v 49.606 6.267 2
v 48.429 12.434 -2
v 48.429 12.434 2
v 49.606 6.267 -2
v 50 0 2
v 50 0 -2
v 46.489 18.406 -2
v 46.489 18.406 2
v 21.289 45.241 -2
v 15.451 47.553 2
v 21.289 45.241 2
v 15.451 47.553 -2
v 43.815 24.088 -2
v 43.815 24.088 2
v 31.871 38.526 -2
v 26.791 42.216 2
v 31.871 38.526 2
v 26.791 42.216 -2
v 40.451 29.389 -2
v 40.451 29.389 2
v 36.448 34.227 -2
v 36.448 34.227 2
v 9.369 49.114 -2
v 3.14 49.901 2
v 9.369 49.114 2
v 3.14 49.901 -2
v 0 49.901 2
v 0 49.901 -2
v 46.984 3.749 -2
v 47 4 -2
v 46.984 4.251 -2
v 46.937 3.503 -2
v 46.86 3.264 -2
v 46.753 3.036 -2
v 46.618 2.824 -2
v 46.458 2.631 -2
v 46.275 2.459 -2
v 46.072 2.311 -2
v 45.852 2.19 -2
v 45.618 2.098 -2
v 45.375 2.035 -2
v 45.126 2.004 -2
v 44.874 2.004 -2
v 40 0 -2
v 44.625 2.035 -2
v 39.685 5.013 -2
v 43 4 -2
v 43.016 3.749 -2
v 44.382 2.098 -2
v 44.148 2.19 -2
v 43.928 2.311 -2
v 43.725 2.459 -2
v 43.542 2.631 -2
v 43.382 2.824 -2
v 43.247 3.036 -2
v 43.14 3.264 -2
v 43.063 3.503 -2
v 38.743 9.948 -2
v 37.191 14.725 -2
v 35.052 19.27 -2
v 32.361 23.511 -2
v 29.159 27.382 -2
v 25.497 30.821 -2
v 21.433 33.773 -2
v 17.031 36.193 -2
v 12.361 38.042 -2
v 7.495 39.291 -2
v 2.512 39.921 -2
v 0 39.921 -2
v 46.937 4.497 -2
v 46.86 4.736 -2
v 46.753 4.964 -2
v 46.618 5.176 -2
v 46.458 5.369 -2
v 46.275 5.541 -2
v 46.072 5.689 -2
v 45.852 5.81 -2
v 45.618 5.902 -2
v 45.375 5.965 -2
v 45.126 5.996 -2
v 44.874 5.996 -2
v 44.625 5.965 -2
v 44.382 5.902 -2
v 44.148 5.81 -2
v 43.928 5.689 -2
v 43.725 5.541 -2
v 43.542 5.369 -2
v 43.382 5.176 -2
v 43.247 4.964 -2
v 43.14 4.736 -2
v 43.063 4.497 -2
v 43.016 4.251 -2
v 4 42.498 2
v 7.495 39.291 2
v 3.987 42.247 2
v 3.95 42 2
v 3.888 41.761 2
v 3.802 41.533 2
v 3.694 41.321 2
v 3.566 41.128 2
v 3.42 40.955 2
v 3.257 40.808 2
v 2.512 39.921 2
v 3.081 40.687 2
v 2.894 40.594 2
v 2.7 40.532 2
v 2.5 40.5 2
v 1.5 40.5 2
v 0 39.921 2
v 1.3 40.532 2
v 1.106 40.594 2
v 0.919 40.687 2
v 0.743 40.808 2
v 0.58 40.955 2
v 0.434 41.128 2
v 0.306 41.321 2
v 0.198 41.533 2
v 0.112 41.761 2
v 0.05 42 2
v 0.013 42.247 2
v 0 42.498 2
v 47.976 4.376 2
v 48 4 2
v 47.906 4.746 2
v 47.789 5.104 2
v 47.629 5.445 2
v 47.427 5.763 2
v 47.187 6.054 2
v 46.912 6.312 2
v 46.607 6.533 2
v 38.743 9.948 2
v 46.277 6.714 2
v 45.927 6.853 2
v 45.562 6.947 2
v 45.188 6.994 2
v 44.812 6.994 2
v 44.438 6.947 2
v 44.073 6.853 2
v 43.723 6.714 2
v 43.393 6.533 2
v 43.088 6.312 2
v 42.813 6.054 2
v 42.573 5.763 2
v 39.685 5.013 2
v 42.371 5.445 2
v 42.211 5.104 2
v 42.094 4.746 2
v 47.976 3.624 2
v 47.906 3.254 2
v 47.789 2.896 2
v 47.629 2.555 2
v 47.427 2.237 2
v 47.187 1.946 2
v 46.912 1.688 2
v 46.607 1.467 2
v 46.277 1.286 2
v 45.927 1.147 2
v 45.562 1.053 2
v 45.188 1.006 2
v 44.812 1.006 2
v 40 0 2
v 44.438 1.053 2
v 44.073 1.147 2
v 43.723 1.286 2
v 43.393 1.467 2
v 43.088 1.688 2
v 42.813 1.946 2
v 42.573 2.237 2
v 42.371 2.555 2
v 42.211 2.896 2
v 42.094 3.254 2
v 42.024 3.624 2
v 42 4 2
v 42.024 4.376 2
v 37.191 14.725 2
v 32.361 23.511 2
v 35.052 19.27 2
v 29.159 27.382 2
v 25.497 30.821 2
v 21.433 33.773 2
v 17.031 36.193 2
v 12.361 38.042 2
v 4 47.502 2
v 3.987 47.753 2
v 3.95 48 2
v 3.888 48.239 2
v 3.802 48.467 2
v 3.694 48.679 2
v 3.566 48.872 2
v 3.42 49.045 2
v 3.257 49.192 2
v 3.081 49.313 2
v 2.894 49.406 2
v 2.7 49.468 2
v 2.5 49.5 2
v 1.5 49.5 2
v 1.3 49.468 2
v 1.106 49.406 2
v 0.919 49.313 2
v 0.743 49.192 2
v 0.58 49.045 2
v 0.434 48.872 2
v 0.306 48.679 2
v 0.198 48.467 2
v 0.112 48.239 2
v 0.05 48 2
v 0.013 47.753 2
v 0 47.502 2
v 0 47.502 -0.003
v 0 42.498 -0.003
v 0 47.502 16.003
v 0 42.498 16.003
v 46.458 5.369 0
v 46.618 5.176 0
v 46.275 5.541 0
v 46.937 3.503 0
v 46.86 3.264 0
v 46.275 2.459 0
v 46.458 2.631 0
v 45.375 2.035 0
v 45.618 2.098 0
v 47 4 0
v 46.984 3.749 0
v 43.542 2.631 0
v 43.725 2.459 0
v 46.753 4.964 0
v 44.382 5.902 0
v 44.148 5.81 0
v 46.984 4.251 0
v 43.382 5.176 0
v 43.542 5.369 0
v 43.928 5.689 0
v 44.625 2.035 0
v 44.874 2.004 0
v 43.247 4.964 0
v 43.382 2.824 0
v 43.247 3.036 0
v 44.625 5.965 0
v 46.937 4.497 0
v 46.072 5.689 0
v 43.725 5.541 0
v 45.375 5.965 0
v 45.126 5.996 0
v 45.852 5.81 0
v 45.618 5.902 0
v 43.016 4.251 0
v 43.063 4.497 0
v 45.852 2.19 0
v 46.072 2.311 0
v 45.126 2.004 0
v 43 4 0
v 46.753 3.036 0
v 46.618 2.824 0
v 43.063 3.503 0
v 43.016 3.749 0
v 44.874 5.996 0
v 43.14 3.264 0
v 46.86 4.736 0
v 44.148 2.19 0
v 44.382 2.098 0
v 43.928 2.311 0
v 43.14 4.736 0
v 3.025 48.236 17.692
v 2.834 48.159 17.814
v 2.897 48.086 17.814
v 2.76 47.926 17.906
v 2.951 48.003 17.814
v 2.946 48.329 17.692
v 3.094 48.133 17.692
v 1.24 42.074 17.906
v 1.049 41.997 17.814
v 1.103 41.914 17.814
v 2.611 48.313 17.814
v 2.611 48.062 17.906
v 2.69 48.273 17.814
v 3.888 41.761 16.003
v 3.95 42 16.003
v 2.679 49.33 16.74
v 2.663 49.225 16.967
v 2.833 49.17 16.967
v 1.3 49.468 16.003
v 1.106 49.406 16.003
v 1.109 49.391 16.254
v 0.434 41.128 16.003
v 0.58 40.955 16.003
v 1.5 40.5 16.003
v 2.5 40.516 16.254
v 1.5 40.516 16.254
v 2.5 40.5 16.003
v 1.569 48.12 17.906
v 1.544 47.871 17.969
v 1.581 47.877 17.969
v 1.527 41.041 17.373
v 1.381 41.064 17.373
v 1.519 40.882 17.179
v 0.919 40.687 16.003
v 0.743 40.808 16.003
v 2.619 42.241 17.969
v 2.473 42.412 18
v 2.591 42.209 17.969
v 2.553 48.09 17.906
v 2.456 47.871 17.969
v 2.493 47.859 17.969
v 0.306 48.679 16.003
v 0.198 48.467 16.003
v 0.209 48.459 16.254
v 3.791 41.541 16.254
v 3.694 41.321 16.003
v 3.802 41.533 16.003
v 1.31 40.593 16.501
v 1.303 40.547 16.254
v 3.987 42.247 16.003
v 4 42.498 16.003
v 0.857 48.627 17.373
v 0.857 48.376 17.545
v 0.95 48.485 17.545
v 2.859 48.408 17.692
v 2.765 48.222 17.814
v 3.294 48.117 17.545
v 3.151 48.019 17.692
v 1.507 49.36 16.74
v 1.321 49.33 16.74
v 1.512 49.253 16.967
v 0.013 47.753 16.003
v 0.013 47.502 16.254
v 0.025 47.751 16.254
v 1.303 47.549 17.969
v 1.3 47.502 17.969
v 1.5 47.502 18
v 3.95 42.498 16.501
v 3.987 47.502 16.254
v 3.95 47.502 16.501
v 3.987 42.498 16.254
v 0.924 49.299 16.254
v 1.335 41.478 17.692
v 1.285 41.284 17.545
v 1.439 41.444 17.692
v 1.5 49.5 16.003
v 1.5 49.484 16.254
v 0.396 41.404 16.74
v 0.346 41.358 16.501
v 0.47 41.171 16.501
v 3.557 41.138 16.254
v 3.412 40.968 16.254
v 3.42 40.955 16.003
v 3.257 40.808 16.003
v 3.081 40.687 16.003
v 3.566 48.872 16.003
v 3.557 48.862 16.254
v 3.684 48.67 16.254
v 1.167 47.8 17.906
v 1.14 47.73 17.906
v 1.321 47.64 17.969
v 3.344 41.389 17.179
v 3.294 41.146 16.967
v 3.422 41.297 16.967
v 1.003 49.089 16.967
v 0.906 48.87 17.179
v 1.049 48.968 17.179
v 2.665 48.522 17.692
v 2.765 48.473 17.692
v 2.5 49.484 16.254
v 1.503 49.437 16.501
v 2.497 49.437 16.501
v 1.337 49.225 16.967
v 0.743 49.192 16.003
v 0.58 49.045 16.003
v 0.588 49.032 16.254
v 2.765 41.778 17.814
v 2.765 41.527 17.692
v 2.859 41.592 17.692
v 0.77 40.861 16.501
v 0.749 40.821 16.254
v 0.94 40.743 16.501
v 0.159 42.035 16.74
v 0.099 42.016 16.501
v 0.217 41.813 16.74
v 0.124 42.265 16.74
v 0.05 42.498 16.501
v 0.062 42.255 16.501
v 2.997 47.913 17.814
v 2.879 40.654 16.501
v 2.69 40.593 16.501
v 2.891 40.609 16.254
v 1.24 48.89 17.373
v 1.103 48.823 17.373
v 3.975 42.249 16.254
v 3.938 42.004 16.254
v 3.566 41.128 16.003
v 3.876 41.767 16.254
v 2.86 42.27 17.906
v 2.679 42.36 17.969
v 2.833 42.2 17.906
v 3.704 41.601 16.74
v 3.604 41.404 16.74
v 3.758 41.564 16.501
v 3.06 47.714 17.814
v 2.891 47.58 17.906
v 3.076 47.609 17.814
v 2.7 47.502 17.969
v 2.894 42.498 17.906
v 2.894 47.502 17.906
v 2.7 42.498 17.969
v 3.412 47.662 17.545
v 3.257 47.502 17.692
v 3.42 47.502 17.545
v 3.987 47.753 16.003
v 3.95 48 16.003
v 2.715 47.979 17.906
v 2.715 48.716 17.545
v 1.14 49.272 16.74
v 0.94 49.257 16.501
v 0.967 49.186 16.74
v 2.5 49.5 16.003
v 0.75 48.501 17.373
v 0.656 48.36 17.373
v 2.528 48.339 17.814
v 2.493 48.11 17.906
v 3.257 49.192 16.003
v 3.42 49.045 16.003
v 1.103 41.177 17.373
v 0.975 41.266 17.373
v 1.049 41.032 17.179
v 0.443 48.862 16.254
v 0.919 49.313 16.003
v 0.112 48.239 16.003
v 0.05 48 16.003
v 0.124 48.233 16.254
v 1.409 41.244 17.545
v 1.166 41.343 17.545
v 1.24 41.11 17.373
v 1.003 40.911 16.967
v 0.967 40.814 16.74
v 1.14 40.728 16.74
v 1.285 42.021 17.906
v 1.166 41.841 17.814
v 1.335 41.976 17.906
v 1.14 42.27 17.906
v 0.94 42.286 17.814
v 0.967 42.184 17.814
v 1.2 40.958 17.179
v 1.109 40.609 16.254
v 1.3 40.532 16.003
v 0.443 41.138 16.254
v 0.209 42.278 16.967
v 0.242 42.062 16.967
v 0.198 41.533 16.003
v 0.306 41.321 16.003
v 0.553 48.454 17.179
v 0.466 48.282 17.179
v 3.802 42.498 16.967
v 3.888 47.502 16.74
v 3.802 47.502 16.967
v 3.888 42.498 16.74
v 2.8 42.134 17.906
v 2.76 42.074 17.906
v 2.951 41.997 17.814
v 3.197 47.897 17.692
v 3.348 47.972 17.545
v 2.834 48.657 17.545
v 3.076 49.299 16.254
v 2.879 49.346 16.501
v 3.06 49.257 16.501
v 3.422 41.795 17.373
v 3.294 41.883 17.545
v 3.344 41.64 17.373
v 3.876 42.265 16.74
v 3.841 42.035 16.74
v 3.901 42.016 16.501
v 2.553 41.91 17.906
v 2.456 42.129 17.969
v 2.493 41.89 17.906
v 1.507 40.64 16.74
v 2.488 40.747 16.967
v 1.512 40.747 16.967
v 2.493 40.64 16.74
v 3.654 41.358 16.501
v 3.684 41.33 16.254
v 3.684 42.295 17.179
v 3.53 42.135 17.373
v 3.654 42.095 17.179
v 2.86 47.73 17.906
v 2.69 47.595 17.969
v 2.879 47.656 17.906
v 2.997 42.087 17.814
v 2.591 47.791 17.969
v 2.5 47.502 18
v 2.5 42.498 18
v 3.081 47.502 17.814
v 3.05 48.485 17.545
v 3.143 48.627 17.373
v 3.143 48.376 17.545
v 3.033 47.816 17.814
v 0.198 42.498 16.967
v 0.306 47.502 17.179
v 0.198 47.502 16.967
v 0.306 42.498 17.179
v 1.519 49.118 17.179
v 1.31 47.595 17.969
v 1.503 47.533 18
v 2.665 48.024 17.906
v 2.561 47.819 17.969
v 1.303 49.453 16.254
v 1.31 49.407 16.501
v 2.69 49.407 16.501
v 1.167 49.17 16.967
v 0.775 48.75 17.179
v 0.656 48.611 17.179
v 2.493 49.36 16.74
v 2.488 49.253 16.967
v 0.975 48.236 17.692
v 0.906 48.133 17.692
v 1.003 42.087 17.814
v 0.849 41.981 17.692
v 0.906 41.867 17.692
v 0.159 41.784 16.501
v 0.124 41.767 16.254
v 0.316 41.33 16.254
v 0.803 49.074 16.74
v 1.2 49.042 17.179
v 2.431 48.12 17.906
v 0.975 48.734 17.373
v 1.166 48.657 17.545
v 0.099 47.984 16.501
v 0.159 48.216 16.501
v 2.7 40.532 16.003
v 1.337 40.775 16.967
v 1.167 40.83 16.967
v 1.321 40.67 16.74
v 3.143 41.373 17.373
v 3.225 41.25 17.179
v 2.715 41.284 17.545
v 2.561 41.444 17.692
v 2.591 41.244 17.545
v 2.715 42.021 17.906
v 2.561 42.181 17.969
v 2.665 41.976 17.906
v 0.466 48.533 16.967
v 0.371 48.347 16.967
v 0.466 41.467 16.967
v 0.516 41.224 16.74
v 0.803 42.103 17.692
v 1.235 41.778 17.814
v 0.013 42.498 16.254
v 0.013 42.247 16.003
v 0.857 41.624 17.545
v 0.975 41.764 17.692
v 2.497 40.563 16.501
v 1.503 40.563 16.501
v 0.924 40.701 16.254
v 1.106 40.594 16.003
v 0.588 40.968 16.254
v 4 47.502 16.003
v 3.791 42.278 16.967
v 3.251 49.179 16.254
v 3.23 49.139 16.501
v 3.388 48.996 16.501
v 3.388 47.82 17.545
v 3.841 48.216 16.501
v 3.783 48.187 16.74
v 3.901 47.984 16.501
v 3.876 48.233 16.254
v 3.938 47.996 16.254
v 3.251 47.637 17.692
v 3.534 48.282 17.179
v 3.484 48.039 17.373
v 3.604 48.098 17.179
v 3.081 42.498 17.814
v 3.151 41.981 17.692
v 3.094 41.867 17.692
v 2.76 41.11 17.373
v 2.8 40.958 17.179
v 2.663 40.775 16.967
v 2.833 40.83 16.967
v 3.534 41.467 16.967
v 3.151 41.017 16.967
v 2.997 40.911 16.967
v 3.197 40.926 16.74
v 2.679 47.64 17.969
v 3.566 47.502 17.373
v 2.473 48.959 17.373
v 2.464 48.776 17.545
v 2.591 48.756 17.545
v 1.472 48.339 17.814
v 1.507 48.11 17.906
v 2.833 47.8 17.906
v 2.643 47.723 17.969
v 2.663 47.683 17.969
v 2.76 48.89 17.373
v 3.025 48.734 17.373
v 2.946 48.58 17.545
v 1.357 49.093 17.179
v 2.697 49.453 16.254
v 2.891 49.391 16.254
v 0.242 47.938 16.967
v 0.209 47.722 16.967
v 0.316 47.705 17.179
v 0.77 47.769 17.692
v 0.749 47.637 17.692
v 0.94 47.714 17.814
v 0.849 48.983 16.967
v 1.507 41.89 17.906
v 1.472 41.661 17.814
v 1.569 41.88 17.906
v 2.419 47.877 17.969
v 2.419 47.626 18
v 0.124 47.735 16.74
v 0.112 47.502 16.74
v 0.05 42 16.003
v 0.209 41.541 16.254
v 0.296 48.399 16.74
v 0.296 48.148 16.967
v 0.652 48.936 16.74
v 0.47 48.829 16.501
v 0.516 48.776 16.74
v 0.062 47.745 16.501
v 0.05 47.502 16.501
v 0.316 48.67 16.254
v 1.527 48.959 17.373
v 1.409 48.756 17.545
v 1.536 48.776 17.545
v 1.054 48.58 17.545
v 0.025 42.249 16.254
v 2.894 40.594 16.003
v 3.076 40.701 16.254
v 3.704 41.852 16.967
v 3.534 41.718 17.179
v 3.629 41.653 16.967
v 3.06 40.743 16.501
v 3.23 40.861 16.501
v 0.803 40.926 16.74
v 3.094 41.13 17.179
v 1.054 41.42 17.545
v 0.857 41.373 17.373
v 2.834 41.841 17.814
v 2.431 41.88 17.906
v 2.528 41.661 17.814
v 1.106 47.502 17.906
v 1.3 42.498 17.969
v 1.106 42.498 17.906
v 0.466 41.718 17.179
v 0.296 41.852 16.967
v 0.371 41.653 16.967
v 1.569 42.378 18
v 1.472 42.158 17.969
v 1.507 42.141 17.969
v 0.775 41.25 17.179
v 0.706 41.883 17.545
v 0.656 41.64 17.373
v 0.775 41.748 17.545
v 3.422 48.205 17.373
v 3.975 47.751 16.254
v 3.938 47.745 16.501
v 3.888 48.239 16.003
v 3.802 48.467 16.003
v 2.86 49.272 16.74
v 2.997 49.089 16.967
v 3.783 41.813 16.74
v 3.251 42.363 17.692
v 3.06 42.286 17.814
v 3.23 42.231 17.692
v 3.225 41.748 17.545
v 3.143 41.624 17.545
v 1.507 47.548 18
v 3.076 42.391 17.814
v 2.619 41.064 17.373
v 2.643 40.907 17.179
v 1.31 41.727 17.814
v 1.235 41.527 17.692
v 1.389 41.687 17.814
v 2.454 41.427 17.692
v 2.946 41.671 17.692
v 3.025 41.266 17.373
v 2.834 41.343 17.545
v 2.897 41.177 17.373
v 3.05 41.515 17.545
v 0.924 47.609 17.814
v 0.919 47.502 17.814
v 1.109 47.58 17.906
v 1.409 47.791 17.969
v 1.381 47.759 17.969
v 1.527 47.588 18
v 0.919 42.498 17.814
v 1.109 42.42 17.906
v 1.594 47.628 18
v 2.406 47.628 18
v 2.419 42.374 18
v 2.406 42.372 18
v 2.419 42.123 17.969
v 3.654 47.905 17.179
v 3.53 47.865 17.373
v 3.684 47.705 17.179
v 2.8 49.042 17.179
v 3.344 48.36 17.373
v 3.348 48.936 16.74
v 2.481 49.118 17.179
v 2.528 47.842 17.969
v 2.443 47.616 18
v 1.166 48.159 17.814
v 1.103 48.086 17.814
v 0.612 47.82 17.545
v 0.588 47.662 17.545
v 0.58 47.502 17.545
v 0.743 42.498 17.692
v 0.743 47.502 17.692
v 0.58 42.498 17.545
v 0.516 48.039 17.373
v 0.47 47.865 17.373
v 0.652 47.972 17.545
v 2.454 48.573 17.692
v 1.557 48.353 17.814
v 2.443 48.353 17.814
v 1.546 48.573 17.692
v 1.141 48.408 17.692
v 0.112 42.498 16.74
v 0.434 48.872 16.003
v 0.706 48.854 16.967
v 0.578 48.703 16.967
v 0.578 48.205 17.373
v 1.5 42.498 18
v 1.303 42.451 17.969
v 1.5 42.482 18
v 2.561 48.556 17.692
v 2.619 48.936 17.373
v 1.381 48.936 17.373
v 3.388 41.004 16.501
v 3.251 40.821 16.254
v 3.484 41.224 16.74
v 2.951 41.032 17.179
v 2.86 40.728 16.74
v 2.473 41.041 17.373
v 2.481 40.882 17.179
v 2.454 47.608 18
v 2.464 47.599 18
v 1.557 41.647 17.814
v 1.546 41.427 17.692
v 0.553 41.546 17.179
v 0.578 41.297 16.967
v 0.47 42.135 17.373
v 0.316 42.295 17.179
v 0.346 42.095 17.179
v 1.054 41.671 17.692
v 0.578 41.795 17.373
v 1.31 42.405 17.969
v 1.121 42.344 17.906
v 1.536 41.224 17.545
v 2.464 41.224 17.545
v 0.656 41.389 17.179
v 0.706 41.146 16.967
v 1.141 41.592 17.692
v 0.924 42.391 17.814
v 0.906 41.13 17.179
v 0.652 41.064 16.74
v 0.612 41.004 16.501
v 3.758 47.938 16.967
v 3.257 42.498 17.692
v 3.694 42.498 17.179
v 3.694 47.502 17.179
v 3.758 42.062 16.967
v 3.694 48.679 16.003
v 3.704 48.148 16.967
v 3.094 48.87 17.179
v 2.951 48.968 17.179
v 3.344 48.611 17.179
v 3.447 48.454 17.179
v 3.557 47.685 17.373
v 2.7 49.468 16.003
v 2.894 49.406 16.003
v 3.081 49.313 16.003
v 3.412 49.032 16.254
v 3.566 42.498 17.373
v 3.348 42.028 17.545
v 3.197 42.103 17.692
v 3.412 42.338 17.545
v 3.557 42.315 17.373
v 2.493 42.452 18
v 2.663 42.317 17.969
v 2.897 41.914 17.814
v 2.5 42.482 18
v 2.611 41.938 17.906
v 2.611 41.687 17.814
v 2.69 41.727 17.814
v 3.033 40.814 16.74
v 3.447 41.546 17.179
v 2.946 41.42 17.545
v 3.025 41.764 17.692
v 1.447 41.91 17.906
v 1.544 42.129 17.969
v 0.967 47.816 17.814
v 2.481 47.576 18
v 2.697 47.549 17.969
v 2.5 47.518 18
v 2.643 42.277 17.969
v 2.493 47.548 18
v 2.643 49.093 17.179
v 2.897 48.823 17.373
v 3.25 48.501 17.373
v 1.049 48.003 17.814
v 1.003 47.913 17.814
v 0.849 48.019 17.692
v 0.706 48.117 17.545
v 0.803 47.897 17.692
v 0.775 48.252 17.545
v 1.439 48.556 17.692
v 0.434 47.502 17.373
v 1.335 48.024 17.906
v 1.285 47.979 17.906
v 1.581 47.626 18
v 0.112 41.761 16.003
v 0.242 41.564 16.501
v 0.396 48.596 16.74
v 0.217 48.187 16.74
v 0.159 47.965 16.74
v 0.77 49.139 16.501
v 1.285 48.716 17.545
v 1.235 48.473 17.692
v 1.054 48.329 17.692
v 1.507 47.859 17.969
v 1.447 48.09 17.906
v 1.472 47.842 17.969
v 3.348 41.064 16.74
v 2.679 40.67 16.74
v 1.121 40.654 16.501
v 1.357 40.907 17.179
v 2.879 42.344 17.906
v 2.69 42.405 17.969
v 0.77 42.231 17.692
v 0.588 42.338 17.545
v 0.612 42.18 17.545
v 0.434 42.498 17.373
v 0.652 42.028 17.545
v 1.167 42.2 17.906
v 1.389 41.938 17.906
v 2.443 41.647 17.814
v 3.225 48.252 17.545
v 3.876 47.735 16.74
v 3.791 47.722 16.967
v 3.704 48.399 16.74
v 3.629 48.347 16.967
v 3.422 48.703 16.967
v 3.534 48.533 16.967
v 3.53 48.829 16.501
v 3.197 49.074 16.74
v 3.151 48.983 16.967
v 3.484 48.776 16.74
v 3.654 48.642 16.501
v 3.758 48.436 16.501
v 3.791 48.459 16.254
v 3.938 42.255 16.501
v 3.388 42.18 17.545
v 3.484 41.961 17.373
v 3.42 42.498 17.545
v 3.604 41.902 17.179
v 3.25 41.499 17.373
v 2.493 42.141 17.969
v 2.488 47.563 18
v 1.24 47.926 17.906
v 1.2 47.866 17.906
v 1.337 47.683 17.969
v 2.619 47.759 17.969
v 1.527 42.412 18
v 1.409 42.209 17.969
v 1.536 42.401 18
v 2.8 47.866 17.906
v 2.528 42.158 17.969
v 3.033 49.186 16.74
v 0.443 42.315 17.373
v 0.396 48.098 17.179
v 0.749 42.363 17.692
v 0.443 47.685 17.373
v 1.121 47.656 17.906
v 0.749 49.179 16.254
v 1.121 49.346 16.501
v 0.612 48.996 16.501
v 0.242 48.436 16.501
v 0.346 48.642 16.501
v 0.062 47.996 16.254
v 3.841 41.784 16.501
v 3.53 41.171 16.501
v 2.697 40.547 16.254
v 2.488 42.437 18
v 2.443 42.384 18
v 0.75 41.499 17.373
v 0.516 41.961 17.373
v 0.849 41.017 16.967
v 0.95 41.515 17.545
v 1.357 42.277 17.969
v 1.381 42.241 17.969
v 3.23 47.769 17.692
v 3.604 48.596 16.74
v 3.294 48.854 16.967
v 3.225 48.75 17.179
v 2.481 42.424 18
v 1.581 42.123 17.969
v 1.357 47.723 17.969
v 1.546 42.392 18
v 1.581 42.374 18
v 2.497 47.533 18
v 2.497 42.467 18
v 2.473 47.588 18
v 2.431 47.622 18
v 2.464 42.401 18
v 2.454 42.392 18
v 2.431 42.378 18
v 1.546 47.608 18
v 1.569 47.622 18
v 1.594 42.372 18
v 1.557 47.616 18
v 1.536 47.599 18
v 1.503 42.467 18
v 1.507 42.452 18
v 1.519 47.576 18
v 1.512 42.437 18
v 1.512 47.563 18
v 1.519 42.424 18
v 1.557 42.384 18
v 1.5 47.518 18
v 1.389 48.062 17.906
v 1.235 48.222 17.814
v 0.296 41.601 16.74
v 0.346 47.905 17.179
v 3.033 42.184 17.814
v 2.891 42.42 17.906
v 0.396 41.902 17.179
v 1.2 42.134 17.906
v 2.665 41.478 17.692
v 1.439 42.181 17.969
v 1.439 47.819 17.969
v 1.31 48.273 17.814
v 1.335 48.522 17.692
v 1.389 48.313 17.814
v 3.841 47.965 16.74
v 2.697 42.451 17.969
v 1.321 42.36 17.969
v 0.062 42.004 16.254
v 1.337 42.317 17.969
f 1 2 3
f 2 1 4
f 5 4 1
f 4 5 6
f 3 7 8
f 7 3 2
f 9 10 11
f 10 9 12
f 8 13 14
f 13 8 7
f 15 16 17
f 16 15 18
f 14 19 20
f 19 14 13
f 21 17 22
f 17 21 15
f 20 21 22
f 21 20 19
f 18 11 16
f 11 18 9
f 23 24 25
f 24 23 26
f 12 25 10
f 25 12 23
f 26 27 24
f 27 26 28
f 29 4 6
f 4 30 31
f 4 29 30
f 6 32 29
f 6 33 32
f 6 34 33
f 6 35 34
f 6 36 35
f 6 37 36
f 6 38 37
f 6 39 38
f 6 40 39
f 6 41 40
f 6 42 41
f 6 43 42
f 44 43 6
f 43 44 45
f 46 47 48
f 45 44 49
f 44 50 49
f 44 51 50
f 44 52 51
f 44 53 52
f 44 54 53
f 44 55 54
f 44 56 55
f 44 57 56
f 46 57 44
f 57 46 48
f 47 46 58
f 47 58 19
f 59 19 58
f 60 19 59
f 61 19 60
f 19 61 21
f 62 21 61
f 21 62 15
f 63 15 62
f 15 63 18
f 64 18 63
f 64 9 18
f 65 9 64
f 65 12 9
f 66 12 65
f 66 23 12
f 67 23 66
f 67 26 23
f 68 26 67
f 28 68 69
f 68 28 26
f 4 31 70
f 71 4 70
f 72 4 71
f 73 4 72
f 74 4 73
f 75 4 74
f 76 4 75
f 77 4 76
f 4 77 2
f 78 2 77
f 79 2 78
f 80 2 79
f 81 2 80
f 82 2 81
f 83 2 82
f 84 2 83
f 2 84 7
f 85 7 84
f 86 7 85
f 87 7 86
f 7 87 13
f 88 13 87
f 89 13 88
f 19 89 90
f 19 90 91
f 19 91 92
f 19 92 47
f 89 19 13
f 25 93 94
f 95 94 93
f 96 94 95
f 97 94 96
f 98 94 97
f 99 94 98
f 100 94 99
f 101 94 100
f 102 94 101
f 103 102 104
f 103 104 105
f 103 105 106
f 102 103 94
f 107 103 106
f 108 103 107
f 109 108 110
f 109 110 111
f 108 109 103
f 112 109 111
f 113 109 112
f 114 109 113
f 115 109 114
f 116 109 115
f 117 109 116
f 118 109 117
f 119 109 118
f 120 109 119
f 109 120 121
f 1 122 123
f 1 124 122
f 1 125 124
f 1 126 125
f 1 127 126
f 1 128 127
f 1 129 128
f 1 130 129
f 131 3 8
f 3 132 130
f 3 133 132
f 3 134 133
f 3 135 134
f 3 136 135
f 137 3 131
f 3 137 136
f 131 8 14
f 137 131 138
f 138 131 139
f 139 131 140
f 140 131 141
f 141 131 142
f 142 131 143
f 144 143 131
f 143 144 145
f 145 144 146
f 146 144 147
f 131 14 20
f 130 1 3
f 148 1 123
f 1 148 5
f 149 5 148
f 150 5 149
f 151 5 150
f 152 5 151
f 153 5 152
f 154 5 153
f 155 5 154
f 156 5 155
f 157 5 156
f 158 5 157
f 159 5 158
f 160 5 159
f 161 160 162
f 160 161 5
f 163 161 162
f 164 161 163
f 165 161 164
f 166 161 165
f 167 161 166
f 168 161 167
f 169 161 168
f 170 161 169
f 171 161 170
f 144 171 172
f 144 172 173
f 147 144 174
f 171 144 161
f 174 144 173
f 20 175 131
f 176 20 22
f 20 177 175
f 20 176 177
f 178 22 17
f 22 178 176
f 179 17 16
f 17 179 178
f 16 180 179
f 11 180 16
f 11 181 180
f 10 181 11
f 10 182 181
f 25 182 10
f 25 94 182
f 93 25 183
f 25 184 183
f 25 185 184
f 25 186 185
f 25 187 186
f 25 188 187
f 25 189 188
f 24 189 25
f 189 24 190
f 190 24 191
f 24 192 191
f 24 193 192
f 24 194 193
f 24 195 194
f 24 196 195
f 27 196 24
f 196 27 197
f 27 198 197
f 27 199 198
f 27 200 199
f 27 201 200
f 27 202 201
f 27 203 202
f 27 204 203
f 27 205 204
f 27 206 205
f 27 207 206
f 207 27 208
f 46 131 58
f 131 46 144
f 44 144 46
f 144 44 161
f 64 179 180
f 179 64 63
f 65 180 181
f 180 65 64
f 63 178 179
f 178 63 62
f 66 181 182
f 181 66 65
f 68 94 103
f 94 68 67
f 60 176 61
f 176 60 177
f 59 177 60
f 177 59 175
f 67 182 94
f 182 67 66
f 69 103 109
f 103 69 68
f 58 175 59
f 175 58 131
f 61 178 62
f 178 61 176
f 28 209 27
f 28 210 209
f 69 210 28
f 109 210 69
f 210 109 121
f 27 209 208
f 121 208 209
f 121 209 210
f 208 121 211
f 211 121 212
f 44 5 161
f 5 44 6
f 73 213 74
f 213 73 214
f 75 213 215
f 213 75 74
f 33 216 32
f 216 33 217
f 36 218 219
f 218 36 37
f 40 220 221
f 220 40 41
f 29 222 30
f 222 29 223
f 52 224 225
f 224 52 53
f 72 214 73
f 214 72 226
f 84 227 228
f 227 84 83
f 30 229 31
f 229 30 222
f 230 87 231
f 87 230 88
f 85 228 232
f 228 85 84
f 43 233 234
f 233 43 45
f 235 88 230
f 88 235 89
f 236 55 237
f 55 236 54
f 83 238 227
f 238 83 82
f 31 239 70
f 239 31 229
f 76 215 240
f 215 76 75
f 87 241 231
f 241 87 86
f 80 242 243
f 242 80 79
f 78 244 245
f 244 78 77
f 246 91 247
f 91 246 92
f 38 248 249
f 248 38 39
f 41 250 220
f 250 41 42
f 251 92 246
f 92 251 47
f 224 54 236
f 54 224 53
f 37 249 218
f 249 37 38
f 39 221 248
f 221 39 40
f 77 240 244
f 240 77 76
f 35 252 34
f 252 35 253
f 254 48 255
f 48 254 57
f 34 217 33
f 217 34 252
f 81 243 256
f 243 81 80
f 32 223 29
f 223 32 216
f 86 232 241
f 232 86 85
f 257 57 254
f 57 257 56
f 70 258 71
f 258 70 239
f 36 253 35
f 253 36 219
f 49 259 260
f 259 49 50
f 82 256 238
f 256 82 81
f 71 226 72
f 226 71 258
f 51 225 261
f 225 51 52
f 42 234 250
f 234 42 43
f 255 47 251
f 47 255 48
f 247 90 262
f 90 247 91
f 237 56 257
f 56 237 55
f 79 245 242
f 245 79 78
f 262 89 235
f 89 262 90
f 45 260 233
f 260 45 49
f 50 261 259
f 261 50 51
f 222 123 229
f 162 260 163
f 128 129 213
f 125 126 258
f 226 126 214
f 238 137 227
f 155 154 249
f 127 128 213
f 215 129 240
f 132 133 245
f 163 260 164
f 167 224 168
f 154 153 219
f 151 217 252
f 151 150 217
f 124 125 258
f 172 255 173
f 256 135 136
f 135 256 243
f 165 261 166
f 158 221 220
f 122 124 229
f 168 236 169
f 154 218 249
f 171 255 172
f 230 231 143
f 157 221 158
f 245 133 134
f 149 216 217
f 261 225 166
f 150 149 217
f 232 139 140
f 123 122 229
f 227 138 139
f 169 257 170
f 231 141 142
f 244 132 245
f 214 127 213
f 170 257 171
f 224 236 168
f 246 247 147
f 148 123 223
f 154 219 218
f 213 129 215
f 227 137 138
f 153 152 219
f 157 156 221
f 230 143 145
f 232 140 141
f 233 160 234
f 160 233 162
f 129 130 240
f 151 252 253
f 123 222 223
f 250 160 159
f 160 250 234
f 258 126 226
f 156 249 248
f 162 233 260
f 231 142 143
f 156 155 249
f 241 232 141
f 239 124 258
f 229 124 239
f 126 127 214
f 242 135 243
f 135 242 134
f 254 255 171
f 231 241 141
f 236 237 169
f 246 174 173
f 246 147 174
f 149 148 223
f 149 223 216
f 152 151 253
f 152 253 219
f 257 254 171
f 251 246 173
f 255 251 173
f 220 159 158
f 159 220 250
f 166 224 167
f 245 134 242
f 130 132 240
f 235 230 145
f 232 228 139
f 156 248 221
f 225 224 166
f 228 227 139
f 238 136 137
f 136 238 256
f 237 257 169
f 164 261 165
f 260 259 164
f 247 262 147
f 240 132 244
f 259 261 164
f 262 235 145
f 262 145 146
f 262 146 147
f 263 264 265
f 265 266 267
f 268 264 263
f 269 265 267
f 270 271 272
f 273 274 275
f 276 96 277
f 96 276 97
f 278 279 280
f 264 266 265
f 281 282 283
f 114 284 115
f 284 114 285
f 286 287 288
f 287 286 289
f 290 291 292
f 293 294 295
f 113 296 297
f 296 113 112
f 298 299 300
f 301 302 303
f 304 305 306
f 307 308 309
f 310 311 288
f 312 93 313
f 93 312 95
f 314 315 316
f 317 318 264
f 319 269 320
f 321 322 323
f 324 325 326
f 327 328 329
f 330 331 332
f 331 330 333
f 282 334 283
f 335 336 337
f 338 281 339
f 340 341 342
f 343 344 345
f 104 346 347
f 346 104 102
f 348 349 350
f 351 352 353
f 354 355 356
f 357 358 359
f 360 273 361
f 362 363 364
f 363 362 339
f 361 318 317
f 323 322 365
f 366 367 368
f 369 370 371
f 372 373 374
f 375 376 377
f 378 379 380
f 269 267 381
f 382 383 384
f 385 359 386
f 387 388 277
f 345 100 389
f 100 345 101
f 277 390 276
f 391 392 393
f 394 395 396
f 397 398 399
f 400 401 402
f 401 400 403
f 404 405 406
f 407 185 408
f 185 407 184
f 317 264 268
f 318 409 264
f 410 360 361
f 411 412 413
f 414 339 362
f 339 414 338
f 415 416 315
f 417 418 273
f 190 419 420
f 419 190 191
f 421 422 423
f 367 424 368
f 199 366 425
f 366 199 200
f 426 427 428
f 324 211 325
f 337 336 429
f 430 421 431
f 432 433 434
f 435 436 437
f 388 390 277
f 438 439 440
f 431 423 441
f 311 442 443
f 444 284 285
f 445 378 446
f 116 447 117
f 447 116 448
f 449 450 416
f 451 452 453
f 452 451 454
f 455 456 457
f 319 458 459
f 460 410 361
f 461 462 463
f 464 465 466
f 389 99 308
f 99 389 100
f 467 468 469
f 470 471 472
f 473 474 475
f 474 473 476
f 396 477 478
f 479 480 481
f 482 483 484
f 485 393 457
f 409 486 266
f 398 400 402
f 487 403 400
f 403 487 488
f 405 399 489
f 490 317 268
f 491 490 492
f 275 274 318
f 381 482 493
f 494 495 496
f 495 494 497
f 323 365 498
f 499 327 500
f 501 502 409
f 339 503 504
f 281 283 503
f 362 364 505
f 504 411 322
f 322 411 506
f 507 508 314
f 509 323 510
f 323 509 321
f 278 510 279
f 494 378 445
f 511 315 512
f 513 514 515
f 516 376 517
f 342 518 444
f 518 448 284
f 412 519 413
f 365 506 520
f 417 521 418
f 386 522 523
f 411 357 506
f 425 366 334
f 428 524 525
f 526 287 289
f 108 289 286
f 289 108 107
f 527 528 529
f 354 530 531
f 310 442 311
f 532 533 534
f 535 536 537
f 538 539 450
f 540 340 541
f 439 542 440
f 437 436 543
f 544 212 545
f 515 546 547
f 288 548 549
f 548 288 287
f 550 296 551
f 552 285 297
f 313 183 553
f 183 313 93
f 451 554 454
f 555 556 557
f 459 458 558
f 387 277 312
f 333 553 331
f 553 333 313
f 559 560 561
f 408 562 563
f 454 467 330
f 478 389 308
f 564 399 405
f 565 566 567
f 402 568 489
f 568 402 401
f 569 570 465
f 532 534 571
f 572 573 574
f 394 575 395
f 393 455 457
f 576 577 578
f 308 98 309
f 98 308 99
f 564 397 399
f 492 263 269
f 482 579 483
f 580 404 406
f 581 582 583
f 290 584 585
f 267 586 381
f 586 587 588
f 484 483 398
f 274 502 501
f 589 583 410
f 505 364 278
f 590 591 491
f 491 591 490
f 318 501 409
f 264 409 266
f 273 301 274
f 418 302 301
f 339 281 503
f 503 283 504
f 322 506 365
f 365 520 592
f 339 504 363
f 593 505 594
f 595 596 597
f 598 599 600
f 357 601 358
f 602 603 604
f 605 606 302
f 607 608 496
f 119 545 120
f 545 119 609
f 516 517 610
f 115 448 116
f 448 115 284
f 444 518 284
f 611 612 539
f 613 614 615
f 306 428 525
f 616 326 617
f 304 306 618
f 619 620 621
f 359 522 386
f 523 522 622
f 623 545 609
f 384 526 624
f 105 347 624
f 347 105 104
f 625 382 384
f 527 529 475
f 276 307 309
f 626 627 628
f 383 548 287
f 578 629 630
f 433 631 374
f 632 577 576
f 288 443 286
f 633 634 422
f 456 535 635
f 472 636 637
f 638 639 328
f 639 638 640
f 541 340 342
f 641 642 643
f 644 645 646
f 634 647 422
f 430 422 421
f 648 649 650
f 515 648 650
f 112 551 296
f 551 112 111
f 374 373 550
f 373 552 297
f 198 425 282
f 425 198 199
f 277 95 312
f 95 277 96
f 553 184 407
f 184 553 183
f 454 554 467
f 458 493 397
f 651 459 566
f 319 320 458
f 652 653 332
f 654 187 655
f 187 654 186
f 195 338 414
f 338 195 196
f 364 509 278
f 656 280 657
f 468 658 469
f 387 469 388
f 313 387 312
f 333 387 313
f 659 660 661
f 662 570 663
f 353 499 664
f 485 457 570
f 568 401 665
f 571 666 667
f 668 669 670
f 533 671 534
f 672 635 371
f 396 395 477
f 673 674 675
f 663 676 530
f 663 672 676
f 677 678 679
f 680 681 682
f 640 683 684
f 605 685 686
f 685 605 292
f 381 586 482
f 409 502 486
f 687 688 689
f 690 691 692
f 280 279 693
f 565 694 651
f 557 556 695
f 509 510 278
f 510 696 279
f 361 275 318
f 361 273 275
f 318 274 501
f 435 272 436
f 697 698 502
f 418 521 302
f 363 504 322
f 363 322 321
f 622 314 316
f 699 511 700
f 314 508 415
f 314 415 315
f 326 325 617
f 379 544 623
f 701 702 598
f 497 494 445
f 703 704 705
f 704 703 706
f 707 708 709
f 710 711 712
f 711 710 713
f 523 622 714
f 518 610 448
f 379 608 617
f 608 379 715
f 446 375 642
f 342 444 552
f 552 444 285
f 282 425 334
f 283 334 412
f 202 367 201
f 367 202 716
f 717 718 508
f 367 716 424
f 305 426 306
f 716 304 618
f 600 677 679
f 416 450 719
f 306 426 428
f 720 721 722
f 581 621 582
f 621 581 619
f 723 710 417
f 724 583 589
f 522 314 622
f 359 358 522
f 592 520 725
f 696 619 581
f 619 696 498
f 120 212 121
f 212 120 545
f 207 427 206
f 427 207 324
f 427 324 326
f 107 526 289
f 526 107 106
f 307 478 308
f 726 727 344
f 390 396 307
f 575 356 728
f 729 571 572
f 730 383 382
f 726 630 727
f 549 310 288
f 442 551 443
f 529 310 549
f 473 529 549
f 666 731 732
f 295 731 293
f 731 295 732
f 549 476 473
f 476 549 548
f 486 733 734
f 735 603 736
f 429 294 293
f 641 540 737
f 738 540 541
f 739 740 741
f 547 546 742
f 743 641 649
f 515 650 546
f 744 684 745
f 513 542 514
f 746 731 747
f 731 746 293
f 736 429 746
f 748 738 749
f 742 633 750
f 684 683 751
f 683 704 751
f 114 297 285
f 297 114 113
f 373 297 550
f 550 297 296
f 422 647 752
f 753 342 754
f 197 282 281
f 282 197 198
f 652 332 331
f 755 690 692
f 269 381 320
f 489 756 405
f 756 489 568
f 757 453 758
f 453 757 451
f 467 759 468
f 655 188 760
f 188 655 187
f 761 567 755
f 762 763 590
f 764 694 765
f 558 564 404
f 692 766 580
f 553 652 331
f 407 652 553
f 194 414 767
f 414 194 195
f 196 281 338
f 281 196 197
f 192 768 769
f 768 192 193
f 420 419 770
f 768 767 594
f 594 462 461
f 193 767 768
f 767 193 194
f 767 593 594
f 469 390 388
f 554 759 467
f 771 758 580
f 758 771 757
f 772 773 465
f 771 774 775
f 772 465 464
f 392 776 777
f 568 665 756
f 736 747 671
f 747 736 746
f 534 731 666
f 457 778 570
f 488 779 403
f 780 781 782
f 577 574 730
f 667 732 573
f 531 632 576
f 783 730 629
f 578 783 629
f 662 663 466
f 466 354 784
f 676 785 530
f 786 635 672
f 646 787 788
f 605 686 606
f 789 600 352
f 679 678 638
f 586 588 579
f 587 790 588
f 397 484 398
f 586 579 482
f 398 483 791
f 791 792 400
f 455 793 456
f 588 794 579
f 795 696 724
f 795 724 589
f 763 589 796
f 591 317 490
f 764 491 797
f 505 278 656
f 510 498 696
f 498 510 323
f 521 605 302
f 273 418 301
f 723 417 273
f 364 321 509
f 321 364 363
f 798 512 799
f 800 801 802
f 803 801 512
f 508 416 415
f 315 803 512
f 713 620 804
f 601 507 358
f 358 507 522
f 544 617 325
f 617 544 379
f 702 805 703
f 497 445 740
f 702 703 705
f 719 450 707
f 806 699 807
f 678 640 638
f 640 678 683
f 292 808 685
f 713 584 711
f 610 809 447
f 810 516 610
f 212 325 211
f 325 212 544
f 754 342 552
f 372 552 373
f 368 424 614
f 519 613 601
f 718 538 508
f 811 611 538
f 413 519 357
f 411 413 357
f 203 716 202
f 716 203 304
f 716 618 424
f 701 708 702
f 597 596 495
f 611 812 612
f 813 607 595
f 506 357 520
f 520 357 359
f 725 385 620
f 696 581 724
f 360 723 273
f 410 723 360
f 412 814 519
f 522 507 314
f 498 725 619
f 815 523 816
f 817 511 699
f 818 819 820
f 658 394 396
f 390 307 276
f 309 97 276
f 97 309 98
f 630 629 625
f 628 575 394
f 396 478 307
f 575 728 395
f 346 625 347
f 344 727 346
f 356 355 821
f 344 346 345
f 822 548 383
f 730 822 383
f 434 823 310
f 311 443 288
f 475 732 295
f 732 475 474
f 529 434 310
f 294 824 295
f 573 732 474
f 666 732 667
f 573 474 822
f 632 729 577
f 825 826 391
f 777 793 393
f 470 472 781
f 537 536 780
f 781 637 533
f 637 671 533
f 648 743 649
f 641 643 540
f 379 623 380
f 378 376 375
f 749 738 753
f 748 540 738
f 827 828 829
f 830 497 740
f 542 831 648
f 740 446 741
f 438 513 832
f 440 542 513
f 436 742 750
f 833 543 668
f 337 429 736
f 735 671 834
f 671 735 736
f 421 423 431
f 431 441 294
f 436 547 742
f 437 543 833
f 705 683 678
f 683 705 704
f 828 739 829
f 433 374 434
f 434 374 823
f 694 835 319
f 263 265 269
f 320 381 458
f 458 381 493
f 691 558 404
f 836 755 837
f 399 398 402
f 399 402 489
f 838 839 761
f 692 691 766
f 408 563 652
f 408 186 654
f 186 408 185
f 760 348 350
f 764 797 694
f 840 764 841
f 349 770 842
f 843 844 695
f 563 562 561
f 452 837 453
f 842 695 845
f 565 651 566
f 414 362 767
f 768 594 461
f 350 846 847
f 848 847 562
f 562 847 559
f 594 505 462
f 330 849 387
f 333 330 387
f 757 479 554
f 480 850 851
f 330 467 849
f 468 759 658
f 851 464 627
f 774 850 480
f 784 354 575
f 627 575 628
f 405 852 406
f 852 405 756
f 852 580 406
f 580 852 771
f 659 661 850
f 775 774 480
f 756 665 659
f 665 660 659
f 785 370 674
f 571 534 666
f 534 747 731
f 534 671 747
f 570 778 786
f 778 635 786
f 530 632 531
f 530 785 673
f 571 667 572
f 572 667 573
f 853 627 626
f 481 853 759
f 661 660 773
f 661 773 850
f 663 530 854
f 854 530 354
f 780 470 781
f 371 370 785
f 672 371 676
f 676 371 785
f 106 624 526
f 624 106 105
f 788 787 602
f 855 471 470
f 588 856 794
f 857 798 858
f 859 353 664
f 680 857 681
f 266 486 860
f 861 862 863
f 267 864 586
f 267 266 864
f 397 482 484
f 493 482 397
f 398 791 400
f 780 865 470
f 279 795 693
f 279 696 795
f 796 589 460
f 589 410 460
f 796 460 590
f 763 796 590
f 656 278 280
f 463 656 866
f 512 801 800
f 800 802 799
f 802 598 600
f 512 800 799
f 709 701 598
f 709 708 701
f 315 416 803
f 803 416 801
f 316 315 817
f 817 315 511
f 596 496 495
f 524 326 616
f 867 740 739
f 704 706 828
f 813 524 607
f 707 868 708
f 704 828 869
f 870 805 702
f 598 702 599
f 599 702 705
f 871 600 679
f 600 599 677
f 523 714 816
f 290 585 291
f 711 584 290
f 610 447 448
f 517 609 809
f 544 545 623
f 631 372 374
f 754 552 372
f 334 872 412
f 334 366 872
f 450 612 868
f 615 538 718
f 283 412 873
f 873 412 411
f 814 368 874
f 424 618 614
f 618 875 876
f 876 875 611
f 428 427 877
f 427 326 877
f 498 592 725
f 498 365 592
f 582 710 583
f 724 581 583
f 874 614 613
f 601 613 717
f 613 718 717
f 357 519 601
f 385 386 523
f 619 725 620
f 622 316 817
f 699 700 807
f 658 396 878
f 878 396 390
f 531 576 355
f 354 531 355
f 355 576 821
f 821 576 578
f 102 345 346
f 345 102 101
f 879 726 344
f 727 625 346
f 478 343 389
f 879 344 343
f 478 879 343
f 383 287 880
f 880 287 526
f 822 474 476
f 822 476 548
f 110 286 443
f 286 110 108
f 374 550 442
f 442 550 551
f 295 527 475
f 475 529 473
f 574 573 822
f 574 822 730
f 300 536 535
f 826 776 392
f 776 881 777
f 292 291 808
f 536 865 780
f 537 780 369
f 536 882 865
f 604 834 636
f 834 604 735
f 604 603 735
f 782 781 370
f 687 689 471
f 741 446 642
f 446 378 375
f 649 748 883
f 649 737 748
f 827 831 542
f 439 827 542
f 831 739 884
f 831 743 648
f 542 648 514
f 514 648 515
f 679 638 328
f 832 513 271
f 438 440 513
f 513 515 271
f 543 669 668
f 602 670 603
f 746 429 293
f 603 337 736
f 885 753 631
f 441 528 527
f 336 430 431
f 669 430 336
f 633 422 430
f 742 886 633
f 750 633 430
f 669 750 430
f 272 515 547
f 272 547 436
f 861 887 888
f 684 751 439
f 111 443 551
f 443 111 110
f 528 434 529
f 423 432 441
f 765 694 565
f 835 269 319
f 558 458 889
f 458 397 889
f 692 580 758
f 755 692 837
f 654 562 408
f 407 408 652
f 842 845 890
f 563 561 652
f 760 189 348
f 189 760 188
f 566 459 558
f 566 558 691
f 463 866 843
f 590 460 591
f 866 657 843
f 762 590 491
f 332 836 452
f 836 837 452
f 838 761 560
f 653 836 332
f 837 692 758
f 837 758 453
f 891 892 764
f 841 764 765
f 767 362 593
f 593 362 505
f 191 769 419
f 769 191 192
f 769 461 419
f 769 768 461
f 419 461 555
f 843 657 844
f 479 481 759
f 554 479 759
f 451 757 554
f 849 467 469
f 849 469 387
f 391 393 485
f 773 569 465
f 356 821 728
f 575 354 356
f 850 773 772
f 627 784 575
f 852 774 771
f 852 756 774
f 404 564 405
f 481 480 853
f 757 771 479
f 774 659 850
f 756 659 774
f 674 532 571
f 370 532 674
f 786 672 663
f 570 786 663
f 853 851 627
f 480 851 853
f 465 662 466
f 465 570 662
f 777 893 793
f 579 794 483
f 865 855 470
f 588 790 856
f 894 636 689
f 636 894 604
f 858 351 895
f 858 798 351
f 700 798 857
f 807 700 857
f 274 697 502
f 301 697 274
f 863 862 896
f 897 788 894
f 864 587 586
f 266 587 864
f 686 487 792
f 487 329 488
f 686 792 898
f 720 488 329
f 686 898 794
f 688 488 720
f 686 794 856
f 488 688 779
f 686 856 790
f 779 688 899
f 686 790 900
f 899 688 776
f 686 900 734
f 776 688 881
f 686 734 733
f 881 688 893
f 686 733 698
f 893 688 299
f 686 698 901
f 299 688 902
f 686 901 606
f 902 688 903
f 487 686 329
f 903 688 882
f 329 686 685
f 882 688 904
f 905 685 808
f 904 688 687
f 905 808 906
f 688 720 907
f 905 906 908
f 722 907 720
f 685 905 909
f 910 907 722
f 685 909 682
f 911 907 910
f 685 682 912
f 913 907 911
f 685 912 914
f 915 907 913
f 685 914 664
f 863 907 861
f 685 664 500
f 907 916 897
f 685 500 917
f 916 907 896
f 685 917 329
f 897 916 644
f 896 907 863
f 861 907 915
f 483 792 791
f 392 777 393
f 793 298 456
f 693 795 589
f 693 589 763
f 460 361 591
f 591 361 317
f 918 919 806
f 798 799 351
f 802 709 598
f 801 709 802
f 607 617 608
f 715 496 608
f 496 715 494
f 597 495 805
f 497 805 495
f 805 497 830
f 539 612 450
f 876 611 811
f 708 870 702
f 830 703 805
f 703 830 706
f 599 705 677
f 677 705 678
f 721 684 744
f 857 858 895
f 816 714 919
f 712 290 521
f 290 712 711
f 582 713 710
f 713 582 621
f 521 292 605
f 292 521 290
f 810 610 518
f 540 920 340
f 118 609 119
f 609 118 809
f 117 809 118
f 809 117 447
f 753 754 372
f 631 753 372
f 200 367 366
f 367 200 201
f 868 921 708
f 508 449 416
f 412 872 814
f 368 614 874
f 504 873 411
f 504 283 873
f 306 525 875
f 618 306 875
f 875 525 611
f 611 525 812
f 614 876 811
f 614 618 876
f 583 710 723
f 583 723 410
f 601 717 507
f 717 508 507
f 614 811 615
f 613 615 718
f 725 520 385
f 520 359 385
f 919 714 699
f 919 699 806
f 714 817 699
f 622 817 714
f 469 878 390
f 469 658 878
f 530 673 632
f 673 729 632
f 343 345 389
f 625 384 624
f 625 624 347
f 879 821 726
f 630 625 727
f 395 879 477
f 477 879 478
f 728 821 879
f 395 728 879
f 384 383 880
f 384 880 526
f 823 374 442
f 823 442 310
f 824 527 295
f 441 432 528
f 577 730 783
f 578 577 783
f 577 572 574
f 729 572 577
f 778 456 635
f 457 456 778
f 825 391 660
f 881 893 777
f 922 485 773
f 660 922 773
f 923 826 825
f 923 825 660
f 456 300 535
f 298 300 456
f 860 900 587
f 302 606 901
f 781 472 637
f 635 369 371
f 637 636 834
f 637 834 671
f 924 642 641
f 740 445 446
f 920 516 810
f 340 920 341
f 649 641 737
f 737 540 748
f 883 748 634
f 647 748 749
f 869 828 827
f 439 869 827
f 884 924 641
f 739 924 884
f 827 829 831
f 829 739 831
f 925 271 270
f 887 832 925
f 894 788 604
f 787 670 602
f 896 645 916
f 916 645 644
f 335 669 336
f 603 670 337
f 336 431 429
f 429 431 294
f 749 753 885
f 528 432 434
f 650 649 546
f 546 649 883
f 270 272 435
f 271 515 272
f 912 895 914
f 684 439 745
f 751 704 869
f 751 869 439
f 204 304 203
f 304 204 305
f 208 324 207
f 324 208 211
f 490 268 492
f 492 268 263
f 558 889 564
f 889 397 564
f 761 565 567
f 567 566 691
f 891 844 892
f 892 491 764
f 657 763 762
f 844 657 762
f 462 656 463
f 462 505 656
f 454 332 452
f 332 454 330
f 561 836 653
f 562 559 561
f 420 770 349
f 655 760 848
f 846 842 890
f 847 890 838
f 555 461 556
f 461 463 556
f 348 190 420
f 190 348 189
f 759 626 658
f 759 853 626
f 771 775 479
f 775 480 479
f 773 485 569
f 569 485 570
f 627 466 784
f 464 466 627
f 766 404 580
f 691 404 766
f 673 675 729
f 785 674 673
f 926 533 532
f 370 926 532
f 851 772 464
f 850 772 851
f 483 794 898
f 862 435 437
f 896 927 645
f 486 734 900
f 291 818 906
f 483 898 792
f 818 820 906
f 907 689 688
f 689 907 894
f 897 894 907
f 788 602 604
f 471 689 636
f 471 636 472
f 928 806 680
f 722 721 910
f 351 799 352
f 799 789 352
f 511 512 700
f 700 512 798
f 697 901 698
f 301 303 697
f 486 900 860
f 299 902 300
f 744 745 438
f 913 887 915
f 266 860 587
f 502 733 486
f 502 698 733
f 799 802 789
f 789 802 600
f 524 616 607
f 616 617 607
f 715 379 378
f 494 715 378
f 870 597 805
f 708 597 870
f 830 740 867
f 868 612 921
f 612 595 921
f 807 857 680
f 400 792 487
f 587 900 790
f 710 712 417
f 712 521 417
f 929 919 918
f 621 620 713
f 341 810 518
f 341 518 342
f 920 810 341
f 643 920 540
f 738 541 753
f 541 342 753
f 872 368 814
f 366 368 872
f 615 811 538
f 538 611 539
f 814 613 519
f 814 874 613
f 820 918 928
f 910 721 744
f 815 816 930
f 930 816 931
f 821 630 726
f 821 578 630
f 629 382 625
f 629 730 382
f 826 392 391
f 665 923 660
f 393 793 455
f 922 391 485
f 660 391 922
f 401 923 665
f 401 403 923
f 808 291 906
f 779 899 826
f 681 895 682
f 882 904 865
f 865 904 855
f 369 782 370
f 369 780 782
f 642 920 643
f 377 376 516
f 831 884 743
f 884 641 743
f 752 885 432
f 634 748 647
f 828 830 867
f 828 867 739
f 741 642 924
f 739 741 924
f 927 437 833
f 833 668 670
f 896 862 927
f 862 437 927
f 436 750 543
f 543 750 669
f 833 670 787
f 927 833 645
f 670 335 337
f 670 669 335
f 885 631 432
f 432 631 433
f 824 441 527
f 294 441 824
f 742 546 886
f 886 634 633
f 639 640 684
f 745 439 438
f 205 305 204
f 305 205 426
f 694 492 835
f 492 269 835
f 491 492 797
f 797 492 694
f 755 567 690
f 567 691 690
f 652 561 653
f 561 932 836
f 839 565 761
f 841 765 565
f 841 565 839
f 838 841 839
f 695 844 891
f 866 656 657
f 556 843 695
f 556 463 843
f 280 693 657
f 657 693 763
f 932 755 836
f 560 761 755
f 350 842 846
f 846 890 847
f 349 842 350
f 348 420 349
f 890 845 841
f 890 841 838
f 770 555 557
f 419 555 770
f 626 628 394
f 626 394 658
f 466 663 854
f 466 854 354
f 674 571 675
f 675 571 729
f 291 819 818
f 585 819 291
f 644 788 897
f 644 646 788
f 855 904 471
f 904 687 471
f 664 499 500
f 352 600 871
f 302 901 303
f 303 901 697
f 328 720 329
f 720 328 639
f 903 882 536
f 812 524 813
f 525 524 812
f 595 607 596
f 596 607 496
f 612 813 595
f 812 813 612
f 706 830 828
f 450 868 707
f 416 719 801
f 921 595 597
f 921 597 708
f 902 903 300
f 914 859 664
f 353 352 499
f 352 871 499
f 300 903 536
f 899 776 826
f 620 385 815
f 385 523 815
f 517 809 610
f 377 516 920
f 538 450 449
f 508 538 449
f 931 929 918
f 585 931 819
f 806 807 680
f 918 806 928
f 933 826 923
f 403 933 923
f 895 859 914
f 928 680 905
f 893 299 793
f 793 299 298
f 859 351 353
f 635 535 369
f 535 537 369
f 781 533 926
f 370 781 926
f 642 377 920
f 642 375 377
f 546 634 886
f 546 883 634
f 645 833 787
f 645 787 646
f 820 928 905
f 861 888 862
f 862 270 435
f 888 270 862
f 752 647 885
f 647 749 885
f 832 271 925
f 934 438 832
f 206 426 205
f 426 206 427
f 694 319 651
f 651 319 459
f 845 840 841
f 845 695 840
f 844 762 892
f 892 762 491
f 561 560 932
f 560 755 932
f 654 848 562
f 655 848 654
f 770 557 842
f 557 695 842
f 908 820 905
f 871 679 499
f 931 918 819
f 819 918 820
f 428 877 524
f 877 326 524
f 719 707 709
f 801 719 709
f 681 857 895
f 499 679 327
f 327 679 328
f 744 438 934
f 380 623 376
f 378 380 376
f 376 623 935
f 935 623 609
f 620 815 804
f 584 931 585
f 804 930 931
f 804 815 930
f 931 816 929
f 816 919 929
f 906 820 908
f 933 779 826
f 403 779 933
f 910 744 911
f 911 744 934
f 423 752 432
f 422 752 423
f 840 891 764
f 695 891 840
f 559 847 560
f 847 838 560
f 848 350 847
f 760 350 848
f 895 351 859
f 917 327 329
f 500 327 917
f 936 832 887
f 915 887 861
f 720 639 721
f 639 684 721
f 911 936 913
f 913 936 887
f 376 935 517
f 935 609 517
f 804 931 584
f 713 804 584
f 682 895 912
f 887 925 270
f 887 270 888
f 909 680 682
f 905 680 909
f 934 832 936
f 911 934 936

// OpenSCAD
/*
 * A simple hasp to hold the lid on my record player inside a shelf.
 */

h=4; // height
s=4; // screw-diameter
o=50; // outer rim radius
i=40; // inner rim radius
n=20; // notch height

$fn=50;

difference()
{
    cylinder(h, r = o, center = true);
    cylinder(h, r = i, center = true);
    translate([-o, 0, -0.5*h]){ cube([o,o,h]); }
    translate([-o, -o, -0.5*h]){ cube([o,o,h]); }
    translate([0, -o, -0.5*h]){ cube([o,o,h]); }
    translate([o-((o-i)*0.5), 0.5*s+2, 0]){ cylinder(h, d = s, center = true); }
    translate([o-((o-i)*0.5), 0.5*s+2, h*0.25]){ cylinder(h*0.5, d1=s, d2=s+2, center=true); }
}
translate([0.5*h, (0.5*(o-i))+i, 0.5*(n-h)]){ notch(); }

module notch()
{
    resize([h, o-i-1, n])
    {
        minkowski()
        {
            cube([1, o-i-h-1, n-h], center = true);
            sphere(d = h);

        }
    }
}
